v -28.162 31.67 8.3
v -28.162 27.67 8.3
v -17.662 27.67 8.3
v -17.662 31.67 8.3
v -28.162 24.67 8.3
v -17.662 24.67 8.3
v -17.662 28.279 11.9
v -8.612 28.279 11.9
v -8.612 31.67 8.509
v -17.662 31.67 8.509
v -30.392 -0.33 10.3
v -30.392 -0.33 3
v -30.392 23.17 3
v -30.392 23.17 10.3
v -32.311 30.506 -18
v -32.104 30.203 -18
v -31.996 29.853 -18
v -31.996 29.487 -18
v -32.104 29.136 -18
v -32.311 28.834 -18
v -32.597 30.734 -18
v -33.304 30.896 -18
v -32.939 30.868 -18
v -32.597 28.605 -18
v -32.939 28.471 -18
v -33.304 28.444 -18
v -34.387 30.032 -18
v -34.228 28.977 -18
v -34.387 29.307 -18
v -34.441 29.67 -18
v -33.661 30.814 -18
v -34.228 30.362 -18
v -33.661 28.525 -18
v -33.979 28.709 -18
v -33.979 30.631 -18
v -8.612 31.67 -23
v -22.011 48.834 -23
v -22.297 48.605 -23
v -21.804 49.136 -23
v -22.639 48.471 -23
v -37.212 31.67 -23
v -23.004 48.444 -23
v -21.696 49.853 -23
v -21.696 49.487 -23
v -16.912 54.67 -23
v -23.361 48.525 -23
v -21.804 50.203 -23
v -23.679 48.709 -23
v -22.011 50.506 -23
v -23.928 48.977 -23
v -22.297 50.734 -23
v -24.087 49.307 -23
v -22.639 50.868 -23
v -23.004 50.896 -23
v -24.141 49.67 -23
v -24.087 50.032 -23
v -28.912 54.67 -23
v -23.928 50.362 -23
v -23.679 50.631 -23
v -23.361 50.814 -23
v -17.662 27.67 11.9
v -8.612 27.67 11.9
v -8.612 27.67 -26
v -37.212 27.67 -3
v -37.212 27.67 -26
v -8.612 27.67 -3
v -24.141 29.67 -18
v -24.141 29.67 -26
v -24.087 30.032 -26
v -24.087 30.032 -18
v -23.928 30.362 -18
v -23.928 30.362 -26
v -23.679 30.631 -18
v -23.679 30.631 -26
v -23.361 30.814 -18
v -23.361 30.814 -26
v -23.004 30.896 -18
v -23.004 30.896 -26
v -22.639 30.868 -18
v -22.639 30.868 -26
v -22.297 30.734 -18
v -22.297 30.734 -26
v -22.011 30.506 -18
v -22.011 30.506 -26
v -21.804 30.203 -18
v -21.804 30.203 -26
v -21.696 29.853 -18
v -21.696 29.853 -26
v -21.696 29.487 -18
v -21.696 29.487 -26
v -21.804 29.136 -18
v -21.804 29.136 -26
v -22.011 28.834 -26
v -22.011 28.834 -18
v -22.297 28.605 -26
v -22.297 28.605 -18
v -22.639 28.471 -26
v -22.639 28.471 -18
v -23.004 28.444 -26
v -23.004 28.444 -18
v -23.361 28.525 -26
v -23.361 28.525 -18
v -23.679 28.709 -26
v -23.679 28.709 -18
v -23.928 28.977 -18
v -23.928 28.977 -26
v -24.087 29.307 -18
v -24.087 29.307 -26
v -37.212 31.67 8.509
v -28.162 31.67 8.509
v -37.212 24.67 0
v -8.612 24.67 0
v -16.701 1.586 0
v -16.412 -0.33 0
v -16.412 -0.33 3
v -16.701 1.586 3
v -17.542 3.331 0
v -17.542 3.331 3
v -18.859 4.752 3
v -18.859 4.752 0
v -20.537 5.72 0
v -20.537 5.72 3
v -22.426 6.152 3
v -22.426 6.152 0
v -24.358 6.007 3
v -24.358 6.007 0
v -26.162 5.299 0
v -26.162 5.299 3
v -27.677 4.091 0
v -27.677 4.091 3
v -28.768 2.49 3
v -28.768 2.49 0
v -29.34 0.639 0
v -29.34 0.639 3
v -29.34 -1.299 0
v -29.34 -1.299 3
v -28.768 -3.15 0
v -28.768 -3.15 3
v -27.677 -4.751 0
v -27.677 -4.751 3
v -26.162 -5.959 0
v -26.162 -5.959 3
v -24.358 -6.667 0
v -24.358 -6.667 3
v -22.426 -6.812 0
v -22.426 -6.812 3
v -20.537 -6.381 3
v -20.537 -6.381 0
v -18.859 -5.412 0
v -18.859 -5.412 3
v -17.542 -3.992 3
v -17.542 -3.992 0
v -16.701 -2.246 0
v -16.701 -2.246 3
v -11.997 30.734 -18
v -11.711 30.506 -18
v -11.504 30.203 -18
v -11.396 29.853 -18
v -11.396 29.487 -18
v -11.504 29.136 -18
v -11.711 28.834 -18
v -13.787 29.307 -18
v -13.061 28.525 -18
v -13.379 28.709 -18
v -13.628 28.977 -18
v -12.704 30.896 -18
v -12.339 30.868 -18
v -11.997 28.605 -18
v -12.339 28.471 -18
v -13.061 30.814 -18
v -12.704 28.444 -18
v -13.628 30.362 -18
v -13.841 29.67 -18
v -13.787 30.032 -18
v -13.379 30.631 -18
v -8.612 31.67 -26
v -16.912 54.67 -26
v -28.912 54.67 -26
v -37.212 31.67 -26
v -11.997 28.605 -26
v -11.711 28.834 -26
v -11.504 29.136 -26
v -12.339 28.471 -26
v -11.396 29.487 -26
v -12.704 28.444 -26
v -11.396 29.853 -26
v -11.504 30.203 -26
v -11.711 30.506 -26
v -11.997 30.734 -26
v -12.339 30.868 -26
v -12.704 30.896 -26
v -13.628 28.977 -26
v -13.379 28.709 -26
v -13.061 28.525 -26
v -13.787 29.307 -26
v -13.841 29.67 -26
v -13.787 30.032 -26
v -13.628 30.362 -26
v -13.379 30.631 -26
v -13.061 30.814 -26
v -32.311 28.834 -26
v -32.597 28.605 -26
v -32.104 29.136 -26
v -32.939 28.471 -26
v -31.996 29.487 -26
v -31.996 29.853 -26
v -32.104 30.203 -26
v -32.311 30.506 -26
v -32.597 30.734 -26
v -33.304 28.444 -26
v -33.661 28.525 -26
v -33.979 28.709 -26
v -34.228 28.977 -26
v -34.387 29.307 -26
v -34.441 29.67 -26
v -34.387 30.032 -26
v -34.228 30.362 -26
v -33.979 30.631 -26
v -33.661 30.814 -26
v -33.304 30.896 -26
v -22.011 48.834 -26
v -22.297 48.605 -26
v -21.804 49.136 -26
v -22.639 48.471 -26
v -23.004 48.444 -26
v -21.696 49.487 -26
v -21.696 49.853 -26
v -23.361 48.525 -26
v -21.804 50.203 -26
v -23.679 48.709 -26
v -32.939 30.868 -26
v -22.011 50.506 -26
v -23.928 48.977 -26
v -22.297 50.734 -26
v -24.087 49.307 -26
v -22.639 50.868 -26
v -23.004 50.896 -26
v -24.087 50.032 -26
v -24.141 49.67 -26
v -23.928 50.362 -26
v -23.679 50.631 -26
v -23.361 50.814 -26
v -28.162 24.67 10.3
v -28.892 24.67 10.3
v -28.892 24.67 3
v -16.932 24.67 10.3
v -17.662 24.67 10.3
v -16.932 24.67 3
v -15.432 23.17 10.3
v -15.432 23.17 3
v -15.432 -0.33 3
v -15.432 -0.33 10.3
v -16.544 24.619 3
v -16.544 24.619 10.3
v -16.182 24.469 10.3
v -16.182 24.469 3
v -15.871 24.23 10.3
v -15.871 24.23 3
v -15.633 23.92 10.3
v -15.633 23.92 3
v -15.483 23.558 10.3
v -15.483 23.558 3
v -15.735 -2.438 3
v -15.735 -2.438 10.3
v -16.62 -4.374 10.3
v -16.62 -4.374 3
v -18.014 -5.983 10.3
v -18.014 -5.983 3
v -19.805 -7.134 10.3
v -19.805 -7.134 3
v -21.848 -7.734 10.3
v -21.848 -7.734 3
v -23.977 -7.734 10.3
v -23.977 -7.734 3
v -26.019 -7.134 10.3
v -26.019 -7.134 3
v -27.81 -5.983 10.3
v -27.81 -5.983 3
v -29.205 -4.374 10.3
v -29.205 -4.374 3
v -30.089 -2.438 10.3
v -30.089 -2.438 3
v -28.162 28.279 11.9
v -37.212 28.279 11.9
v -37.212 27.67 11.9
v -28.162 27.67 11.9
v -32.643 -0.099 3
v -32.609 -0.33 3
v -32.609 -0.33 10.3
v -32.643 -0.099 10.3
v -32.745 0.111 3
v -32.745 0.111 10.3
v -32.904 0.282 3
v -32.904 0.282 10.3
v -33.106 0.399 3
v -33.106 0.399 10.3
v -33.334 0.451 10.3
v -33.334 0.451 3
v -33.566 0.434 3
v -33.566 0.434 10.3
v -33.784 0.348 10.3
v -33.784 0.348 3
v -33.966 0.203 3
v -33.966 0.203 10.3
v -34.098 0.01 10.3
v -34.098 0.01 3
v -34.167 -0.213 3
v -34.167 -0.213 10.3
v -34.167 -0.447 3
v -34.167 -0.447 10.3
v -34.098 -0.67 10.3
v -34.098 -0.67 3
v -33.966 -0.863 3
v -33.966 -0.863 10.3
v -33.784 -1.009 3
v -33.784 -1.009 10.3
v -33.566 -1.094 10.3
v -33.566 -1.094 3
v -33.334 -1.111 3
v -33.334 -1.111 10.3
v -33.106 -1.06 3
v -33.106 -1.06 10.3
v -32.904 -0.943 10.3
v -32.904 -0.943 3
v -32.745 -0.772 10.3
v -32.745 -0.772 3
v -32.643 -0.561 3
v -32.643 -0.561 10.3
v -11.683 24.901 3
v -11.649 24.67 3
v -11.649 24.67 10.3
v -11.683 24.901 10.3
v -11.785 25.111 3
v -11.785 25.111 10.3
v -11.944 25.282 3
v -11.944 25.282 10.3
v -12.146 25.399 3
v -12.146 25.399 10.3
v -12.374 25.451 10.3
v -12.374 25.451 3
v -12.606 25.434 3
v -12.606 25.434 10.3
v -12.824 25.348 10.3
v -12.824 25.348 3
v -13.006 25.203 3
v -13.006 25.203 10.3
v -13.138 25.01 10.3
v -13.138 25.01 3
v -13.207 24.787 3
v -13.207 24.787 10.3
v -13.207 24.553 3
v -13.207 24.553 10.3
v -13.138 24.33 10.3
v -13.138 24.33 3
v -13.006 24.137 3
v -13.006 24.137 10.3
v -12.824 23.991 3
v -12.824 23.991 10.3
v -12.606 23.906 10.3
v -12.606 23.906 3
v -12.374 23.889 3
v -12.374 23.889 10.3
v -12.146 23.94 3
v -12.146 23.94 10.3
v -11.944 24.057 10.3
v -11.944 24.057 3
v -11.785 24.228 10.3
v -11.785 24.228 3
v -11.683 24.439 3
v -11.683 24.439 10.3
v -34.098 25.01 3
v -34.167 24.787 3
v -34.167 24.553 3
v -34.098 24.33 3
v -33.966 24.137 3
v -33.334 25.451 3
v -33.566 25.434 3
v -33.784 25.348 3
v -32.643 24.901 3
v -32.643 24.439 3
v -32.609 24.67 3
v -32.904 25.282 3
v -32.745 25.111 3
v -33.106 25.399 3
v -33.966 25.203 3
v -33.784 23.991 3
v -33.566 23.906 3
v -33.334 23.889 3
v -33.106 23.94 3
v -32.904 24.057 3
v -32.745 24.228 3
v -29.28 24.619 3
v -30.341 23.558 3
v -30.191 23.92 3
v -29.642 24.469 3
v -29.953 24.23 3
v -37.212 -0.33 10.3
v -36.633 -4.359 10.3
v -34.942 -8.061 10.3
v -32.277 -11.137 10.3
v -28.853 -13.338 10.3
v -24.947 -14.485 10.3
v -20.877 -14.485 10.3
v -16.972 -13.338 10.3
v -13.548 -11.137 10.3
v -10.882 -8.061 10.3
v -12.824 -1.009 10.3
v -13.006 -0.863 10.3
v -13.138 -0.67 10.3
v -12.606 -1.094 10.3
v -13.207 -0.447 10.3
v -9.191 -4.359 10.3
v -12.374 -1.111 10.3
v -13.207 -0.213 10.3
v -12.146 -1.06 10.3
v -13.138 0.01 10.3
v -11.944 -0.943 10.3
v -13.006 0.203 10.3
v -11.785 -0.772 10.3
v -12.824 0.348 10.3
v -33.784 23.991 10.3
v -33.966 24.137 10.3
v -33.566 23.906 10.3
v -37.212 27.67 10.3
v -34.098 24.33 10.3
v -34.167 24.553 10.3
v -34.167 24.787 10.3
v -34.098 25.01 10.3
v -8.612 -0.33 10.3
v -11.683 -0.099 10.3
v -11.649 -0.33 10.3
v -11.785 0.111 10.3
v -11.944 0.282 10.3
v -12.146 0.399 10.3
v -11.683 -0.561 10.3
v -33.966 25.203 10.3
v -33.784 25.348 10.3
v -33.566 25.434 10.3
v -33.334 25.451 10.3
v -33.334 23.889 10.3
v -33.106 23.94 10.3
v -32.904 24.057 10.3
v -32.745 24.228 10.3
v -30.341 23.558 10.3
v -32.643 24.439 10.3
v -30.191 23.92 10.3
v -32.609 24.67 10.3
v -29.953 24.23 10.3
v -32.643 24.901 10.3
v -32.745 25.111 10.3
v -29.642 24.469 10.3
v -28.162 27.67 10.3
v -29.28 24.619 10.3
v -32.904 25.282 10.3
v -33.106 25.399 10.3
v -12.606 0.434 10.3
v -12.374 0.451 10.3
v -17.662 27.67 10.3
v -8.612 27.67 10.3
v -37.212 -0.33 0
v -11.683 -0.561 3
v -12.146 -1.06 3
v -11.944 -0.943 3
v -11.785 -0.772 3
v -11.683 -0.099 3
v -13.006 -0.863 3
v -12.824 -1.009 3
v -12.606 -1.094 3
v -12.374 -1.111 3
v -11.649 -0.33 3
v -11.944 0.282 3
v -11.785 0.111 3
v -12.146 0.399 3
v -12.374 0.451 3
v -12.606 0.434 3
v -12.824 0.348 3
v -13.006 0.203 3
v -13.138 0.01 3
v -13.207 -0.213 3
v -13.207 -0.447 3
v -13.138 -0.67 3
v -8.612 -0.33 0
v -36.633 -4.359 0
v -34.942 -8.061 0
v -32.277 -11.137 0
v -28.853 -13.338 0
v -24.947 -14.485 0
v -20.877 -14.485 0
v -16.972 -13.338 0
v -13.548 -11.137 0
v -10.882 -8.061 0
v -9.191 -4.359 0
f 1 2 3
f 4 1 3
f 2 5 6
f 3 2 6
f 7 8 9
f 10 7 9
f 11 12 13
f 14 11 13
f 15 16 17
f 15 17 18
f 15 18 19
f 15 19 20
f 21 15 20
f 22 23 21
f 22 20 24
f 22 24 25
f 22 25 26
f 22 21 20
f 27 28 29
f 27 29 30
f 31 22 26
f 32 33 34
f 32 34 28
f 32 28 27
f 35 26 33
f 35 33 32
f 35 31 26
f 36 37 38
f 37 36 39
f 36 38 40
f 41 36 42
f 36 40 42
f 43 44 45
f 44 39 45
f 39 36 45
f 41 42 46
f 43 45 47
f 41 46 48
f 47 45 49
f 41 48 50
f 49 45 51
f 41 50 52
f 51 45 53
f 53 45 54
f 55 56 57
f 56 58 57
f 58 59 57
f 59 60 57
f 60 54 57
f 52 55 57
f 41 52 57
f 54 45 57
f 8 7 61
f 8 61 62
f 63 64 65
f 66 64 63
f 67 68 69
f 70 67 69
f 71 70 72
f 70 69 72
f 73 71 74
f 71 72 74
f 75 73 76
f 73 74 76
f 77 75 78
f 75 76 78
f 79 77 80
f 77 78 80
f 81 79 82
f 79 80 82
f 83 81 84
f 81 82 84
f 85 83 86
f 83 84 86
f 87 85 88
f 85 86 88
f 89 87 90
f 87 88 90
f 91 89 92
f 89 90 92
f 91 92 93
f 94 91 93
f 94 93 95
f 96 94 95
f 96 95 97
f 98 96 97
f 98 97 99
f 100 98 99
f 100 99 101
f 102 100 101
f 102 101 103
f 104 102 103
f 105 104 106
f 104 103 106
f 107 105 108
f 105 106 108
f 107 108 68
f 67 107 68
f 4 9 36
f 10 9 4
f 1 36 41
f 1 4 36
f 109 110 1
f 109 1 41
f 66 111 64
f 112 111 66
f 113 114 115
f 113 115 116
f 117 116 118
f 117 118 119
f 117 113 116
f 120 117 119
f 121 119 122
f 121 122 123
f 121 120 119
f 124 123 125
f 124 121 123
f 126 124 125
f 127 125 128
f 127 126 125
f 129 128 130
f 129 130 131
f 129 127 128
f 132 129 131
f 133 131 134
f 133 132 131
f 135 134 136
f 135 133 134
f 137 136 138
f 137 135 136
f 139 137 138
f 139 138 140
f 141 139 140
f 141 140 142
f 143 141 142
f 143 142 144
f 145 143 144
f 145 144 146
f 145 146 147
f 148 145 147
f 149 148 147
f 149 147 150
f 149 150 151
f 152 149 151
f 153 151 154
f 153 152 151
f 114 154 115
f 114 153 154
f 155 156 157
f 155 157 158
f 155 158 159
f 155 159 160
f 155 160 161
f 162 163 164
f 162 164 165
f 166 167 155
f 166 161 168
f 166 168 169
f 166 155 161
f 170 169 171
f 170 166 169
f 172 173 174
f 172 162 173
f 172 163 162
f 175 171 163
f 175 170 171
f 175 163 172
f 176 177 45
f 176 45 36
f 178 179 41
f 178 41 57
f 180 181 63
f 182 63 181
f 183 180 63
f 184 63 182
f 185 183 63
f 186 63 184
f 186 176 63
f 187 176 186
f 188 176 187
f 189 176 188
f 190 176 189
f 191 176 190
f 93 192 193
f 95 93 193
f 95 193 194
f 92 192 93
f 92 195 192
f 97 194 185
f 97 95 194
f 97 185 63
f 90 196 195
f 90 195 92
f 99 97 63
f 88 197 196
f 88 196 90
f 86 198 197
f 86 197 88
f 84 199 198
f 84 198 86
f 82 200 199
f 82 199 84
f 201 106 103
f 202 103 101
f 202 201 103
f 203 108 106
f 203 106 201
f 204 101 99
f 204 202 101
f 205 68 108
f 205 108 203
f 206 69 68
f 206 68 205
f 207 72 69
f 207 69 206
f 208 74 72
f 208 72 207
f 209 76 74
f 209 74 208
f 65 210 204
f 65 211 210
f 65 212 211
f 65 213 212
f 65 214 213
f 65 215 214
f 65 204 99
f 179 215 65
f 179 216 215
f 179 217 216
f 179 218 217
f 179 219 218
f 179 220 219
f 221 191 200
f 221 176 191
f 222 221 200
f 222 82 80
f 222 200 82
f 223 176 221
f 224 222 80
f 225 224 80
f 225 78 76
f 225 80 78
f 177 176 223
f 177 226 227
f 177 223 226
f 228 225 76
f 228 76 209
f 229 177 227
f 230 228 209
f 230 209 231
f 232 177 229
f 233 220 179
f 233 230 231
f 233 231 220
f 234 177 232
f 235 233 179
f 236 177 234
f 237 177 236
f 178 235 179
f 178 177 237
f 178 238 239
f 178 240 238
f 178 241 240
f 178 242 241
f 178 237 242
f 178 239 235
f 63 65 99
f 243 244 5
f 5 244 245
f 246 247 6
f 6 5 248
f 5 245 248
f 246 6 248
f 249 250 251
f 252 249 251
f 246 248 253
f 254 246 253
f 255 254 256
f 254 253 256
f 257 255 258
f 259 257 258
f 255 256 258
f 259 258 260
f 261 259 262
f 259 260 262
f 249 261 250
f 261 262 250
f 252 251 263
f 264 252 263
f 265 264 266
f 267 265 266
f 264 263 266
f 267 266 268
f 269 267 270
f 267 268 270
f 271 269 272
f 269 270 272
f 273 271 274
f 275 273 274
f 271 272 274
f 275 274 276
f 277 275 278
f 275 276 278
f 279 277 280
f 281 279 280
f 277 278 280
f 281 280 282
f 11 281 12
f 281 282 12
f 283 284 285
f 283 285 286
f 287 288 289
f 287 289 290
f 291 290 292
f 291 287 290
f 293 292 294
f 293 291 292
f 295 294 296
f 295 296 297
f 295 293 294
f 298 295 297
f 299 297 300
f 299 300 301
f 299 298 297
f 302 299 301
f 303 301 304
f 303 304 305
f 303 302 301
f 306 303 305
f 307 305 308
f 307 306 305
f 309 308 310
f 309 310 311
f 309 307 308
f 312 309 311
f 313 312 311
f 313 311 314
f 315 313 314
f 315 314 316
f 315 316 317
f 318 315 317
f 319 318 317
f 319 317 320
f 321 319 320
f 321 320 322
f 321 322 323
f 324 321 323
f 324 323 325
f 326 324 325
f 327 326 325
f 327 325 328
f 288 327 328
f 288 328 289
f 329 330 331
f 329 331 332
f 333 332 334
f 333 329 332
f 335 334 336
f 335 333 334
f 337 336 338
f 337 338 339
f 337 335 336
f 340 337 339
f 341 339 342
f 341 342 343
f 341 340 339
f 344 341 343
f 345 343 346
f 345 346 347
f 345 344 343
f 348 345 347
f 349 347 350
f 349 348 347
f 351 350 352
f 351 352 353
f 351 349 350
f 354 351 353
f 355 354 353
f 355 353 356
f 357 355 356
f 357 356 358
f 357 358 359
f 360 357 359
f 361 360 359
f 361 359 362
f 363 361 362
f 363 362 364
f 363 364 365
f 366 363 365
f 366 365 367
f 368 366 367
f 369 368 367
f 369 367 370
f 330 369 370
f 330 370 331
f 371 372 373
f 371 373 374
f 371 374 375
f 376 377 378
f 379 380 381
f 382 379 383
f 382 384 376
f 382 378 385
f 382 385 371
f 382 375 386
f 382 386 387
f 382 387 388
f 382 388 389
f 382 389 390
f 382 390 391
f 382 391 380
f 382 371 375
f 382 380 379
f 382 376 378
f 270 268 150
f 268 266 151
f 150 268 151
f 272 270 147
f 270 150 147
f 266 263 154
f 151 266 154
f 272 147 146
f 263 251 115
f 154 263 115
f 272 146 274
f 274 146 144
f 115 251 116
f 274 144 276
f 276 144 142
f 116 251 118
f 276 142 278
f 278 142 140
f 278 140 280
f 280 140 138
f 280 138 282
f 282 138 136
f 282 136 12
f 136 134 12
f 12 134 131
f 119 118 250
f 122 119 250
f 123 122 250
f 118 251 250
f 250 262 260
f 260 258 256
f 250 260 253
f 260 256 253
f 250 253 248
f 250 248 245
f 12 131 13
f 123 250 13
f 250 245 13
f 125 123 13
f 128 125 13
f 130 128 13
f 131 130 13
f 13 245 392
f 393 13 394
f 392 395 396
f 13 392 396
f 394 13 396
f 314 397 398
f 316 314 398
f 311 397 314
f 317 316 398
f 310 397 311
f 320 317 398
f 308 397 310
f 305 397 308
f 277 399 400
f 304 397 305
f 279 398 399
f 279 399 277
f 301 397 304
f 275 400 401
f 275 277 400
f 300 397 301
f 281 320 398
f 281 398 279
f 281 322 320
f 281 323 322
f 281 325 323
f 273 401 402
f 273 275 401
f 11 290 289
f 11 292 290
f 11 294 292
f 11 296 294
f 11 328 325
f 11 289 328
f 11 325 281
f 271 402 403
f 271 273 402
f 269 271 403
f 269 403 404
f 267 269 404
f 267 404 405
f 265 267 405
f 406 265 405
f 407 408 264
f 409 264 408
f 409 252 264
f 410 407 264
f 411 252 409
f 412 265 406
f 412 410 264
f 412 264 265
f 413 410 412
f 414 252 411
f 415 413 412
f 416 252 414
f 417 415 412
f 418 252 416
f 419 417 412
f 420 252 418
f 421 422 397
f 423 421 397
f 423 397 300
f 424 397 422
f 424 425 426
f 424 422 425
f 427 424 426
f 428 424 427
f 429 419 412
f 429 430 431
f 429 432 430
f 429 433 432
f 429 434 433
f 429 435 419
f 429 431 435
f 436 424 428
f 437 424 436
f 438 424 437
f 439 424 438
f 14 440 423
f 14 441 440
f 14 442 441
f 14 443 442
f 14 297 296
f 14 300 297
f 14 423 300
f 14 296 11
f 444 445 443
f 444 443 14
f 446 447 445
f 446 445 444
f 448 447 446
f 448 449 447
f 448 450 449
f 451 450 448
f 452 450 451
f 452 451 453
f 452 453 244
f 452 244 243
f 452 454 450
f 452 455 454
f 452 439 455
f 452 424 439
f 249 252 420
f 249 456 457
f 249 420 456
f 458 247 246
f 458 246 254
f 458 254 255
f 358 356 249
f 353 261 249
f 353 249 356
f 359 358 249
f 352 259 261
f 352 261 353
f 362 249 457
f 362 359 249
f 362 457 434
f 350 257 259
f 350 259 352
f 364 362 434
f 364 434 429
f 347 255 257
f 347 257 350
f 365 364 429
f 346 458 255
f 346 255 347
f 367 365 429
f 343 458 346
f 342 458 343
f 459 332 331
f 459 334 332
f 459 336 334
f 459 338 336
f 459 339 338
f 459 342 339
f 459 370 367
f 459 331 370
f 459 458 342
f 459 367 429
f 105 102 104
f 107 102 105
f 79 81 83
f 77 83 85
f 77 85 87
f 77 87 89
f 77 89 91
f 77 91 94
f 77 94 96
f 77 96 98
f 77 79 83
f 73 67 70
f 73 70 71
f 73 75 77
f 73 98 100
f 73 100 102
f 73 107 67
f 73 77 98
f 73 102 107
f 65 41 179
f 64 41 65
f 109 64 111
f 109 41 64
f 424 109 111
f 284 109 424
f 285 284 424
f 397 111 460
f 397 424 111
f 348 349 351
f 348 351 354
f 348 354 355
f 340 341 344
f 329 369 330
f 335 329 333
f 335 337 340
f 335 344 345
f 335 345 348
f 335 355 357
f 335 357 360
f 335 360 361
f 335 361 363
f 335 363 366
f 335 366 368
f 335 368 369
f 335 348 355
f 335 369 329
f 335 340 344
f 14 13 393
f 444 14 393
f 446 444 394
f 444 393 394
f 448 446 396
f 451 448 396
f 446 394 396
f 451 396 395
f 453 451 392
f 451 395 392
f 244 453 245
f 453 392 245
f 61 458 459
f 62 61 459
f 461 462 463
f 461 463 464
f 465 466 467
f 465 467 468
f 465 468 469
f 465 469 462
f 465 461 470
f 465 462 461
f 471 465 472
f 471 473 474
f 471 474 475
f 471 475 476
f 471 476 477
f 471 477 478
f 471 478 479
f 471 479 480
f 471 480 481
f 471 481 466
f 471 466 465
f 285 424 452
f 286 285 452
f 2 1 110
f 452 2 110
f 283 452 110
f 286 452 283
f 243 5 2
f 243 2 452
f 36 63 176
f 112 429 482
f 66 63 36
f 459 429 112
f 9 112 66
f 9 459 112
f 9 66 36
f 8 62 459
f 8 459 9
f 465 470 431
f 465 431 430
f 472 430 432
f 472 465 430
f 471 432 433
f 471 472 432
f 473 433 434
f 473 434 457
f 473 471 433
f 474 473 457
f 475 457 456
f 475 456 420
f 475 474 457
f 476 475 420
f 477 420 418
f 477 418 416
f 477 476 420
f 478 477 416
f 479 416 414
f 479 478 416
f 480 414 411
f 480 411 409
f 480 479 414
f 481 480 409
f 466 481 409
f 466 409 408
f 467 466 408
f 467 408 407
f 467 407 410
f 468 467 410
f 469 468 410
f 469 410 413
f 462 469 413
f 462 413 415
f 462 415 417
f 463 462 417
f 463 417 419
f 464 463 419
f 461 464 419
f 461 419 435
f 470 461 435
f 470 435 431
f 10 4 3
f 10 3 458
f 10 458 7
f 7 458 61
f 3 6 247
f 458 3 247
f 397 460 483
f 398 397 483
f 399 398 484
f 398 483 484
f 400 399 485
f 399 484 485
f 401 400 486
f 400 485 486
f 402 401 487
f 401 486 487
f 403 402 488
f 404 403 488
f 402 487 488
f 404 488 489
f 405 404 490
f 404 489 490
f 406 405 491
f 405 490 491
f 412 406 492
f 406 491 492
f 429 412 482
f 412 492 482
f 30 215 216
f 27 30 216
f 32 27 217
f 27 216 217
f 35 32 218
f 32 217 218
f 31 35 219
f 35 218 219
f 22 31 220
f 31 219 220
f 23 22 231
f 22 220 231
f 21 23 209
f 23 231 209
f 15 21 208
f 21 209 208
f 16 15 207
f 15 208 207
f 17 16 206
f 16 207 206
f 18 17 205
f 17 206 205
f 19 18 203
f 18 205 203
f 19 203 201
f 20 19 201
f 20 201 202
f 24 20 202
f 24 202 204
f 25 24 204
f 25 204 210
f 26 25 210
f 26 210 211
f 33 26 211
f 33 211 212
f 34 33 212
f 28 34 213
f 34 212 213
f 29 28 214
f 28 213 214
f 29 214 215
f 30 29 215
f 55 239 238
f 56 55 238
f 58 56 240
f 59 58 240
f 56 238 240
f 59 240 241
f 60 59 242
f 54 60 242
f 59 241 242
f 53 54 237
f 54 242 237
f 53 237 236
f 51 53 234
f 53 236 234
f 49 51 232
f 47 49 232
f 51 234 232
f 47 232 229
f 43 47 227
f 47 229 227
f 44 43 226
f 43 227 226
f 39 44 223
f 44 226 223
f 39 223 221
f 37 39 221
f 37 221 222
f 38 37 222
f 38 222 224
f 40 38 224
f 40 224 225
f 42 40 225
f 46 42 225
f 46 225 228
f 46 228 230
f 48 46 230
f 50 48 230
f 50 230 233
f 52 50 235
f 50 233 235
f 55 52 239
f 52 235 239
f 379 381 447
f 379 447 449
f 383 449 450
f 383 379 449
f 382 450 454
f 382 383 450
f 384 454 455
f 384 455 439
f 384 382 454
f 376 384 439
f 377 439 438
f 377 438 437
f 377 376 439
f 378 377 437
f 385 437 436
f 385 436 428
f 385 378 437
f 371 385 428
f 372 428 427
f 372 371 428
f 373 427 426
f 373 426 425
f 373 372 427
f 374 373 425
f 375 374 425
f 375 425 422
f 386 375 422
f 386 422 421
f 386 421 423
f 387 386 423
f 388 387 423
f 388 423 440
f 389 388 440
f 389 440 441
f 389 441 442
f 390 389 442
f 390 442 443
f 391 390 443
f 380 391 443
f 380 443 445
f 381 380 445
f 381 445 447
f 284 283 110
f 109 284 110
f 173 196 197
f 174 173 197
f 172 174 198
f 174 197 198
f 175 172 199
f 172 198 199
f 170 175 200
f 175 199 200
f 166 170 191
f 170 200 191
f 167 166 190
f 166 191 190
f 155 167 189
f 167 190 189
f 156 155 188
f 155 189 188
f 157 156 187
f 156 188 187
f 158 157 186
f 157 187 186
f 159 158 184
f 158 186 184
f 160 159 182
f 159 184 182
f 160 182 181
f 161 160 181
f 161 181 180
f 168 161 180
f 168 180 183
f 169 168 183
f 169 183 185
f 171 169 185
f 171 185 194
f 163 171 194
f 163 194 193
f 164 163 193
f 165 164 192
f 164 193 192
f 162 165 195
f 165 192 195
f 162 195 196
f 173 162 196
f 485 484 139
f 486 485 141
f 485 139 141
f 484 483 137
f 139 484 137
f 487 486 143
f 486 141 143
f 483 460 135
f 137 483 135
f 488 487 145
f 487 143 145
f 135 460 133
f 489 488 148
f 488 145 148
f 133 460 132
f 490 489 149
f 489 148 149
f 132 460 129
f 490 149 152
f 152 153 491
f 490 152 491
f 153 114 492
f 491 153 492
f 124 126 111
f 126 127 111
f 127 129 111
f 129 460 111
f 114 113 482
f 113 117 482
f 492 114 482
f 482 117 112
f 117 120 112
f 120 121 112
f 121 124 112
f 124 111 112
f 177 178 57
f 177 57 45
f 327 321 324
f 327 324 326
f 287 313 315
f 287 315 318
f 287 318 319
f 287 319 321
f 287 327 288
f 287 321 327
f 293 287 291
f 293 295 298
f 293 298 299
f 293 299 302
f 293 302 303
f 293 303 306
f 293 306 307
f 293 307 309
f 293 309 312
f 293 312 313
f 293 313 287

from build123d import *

# Parameters (mm, degrees)
MODEL_R             = 0.7834936
EXTRUDE_1_DEPTH     = 10.3
MODEL_3_W           = 10.5
MODEL_3_H           = 3
EXTRUDE_2_DEPTH     = 8.3
MODEL_4_R           = 6.5
EXTRUDE_3_DEPTH     = 3
SKETCH_2_W          = 28.6
SKETCH_2_H          = 4
EXTRUDE_4_DEPTH     = 1.6
SKETCH_3_W          = 10.5
SKETCH_3_H          = 5.089019843
CUT_EXTRUDE_1_DEPTH = 5.6
MODEL_5_W           = 28.6
MODEL_5_H           = 4
EXTRUDE_5_DEPTH     = 26
MODEL_6_R           = 0.7834936
EXTRUDE_6_DEPTH     = 3
SKETCH_4_R          = 1.229367
EXTRUDE_7_DEPTH     = 3
SKETCH_4_3_R        = 1.229367
CUT_EXTRUDE_2_DEPTH = 8
CHAMFER_1_SIZE      = 3
CUT_EXTRUDE_3_DEPTH = 30


with BuildPart() as part:
    # Model → Extrude 1 (new body)
    with BuildSketch(Plane.XY):
        with BuildLine():
            Line((-37.212112801, 31.669809042), (-37.212112801, -0.330212606))
            ThreePointArc((-37.212112801, -0.330212606), (-22.912101977, -14.630201782), (-8.612112801, -0.330190958))
            Line((-8.612112801, -0.330190958), (-8.612112801, 31.669809042))
            Line((-8.612112801, 31.669809042), (-37.212112801, 31.669809042))
        make_face()
        with BuildLine():
            Line((-28.162112801, 27.669809042), (-17.662112801, 27.669809042))
            Line((-17.662112801, 27.669809042), (-17.662112801, 24.669809042))
            Line((-17.662112801, 24.669809042), (-16.932112801, 24.669809042))
            ThreePointArc((-16.932112801, 24.669809042), (-15.87145263, 24.230469214), (-15.432112801, 23.169809042))
            Line((-15.432112801, 23.169809042), (-15.432112801, -0.330190958))
            ThreePointArc((-15.432112801, -0.330190958), (-22.912112801, -7.810190958), (-30.392112801, -0.330190958))
            Line((-30.392112801, -0.330190958), (-30.392112801, 23.169809042))
            ThreePointArc((-30.392112801, 23.169809042), (-29.952772973, 24.230469214), (-28.892112801, 24.669809042))
            Line((-28.892112801, 24.669809042), (-28.162112801, 24.669809042))
            Line((-28.162112801, 24.669809042), (-28.162112801, 27.669809042))
        make_face(mode=Mode.SUBTRACT)
        with Locations((-33.392112801, 24.669809042)):
            Circle(MODEL_R, mode=Mode.SUBTRACT)
        with Locations((-12.432112801, 24.669809042)):
            Circle(MODEL_R, mode=Mode.SUBTRACT)
        with Locations((-33.392112801, -0.330190958)):
            Circle(MODEL_R, mode=Mode.SUBTRACT)
        with Locations((-12.432112801, -0.330190958)):
            Circle(MODEL_R, mode=Mode.SUBTRACT)
    extrude(amount=EXTRUDE_1_DEPTH)

    # Model_3 → Extrude 2 (add)
    with BuildSketch(Plane.XY):
        with Locations((-22.912112801, 26.169809042)):
            Rectangle(MODEL_3_W, MODEL_3_H)
    extrude(amount=EXTRUDE_2_DEPTH)

    # Model_4 → Extrude 3 (add)
    with BuildSketch(Plane.XY):
        with BuildLine():
            Line((-17.662112801, 24.669809042), (-28.162112801, 24.669809042))
            Line((-28.162112801, 24.669809042), (-28.892112801, 24.669809042))
            ThreePointArc((-28.892112801, 24.669809042), (-29.952772973, 24.230469214), (-30.392112801, 23.169809042))
            Line((-30.392112801, 23.169809042), (-30.392112801, -0.330190958))
            ThreePointArc((-30.392112801, -0.330190958), (-22.912112801, -7.810190958), (-15.432112801, -0.330190958))
            Line((-15.432112801, -0.330190958), (-15.432112801, 23.169809042))
            ThreePointArc((-15.432112801, 23.169809042), (-15.87145263, 24.230469214), (-16.932112801, 24.669809042))
            Line((-16.932112801, 24.669809042), (-17.662112801, 24.669809042))
        make_face()
        with Locations((-22.912112801, -0.330190958)):
            Circle(MODEL_4_R, mode=Mode.SUBTRACT)
    extrude(amount=EXTRUDE_3_DEPTH)

    # Sketch 2 → Extrude 4 (add)
    with BuildSketch(Plane.XY.offset(10.3)):
        with Locations((-22.912112801, 29.669809042)):
            Rectangle(SKETCH_2_W, SKETCH_2_H)
    extrude(amount=EXTRUDE_4_DEPTH)

    # Sketch 3 → Cut-Extrude 1 (cut)
    with BuildSketch(Plane.XZ.offset(-27.669809042)):
        with Locations((-22.912112801, 10.844509922)):
            Rectangle(SKETCH_3_W, SKETCH_3_H)
    extrude(amount=-CUT_EXTRUDE_1_DEPTH, mode=Mode.SUBTRACT)

    # Model_5 → Extrude 5 (add)
    with BuildSketch(Plane.XY):
        with Locations((-22.912112801, 29.669809042)):
            Rectangle(MODEL_5_W, MODEL_5_H)
    extrude(amount=-EXTRUDE_5_DEPTH)

    # Model_6 → Extrude 6 (add)
    with BuildSketch(Plane.XY):
        with Locations((-12.432112801, -0.330190958)):
            Circle(MODEL_6_R)
        with Locations((-33.392112801, -0.330190958)):
            Circle(MODEL_6_R)
        with Locations((-12.432112801, 24.669809042)):
            Circle(MODEL_6_R)
        with Locations((-33.392112801, 24.669809042)):
            Circle(MODEL_6_R)
    extrude(amount=EXTRUDE_6_DEPTH)

    # Sketch 4 → Extrude 7 (add)
    with BuildSketch(Plane(origin=(0, 0, -26), x_dir=(-1, 0, 0), z_dir=(0, 0, -1))):
        Polygon((37.212112801, 31.669809042), (28.912112801, 54.669809042), (16.912112801, 54.669809042), (8.612112801, 31.669809042), align=None)
        with Locations((22.912112801, 49.669809042)):
            Circle(SKETCH_4_R, mode=Mode.SUBTRACT)
    extrude(amount=-EXTRUDE_7_DEPTH)

    # Sketch 4_3 → Cut-Extrude 2 (cut)
    with BuildSketch(Plane(origin=(0, 0, -26), x_dir=(-1, 0, 0), z_dir=(0, 0, -1))):
        with Locations((12.612112801, 29.669809042)):
            Circle(SKETCH_4_3_R)
        with Locations((33.212112801, 29.669809042)):
            Circle(SKETCH_4_3_R)
        with Locations((22.912112801, 29.669809042)):
            Circle(SKETCH_4_3_R)
    extrude(amount=-CUT_EXTRUDE_2_DEPTH, mode=Mode.SUBTRACT)

    # Chamfer 1
    chamfer_1_edges = [part.edges().sort_by_distance(p)[0] for p in [
        (-22.912112801, 27.669809042, 0),
    ]]
    chamfer(chamfer_1_edges, length=CHAMFER_1_SIZE)

    # Sketch 5 → Cut-Extrude 3 (cut)
    with BuildSketch(Plane(origin=(-8.612112801, 0, 0), x_dir=(0, 0, -1), z_dir=(1, 0, 0))):
        Polygon((-11.9, 31.669809042), (-11.9, 28.278558322), (-8.50874928, 31.669809042), align=None)
    extrude(amount=-CUT_EXTRUDE_3_DEPTH, mode=Mode.SUBTRACT)


solid = part.part
